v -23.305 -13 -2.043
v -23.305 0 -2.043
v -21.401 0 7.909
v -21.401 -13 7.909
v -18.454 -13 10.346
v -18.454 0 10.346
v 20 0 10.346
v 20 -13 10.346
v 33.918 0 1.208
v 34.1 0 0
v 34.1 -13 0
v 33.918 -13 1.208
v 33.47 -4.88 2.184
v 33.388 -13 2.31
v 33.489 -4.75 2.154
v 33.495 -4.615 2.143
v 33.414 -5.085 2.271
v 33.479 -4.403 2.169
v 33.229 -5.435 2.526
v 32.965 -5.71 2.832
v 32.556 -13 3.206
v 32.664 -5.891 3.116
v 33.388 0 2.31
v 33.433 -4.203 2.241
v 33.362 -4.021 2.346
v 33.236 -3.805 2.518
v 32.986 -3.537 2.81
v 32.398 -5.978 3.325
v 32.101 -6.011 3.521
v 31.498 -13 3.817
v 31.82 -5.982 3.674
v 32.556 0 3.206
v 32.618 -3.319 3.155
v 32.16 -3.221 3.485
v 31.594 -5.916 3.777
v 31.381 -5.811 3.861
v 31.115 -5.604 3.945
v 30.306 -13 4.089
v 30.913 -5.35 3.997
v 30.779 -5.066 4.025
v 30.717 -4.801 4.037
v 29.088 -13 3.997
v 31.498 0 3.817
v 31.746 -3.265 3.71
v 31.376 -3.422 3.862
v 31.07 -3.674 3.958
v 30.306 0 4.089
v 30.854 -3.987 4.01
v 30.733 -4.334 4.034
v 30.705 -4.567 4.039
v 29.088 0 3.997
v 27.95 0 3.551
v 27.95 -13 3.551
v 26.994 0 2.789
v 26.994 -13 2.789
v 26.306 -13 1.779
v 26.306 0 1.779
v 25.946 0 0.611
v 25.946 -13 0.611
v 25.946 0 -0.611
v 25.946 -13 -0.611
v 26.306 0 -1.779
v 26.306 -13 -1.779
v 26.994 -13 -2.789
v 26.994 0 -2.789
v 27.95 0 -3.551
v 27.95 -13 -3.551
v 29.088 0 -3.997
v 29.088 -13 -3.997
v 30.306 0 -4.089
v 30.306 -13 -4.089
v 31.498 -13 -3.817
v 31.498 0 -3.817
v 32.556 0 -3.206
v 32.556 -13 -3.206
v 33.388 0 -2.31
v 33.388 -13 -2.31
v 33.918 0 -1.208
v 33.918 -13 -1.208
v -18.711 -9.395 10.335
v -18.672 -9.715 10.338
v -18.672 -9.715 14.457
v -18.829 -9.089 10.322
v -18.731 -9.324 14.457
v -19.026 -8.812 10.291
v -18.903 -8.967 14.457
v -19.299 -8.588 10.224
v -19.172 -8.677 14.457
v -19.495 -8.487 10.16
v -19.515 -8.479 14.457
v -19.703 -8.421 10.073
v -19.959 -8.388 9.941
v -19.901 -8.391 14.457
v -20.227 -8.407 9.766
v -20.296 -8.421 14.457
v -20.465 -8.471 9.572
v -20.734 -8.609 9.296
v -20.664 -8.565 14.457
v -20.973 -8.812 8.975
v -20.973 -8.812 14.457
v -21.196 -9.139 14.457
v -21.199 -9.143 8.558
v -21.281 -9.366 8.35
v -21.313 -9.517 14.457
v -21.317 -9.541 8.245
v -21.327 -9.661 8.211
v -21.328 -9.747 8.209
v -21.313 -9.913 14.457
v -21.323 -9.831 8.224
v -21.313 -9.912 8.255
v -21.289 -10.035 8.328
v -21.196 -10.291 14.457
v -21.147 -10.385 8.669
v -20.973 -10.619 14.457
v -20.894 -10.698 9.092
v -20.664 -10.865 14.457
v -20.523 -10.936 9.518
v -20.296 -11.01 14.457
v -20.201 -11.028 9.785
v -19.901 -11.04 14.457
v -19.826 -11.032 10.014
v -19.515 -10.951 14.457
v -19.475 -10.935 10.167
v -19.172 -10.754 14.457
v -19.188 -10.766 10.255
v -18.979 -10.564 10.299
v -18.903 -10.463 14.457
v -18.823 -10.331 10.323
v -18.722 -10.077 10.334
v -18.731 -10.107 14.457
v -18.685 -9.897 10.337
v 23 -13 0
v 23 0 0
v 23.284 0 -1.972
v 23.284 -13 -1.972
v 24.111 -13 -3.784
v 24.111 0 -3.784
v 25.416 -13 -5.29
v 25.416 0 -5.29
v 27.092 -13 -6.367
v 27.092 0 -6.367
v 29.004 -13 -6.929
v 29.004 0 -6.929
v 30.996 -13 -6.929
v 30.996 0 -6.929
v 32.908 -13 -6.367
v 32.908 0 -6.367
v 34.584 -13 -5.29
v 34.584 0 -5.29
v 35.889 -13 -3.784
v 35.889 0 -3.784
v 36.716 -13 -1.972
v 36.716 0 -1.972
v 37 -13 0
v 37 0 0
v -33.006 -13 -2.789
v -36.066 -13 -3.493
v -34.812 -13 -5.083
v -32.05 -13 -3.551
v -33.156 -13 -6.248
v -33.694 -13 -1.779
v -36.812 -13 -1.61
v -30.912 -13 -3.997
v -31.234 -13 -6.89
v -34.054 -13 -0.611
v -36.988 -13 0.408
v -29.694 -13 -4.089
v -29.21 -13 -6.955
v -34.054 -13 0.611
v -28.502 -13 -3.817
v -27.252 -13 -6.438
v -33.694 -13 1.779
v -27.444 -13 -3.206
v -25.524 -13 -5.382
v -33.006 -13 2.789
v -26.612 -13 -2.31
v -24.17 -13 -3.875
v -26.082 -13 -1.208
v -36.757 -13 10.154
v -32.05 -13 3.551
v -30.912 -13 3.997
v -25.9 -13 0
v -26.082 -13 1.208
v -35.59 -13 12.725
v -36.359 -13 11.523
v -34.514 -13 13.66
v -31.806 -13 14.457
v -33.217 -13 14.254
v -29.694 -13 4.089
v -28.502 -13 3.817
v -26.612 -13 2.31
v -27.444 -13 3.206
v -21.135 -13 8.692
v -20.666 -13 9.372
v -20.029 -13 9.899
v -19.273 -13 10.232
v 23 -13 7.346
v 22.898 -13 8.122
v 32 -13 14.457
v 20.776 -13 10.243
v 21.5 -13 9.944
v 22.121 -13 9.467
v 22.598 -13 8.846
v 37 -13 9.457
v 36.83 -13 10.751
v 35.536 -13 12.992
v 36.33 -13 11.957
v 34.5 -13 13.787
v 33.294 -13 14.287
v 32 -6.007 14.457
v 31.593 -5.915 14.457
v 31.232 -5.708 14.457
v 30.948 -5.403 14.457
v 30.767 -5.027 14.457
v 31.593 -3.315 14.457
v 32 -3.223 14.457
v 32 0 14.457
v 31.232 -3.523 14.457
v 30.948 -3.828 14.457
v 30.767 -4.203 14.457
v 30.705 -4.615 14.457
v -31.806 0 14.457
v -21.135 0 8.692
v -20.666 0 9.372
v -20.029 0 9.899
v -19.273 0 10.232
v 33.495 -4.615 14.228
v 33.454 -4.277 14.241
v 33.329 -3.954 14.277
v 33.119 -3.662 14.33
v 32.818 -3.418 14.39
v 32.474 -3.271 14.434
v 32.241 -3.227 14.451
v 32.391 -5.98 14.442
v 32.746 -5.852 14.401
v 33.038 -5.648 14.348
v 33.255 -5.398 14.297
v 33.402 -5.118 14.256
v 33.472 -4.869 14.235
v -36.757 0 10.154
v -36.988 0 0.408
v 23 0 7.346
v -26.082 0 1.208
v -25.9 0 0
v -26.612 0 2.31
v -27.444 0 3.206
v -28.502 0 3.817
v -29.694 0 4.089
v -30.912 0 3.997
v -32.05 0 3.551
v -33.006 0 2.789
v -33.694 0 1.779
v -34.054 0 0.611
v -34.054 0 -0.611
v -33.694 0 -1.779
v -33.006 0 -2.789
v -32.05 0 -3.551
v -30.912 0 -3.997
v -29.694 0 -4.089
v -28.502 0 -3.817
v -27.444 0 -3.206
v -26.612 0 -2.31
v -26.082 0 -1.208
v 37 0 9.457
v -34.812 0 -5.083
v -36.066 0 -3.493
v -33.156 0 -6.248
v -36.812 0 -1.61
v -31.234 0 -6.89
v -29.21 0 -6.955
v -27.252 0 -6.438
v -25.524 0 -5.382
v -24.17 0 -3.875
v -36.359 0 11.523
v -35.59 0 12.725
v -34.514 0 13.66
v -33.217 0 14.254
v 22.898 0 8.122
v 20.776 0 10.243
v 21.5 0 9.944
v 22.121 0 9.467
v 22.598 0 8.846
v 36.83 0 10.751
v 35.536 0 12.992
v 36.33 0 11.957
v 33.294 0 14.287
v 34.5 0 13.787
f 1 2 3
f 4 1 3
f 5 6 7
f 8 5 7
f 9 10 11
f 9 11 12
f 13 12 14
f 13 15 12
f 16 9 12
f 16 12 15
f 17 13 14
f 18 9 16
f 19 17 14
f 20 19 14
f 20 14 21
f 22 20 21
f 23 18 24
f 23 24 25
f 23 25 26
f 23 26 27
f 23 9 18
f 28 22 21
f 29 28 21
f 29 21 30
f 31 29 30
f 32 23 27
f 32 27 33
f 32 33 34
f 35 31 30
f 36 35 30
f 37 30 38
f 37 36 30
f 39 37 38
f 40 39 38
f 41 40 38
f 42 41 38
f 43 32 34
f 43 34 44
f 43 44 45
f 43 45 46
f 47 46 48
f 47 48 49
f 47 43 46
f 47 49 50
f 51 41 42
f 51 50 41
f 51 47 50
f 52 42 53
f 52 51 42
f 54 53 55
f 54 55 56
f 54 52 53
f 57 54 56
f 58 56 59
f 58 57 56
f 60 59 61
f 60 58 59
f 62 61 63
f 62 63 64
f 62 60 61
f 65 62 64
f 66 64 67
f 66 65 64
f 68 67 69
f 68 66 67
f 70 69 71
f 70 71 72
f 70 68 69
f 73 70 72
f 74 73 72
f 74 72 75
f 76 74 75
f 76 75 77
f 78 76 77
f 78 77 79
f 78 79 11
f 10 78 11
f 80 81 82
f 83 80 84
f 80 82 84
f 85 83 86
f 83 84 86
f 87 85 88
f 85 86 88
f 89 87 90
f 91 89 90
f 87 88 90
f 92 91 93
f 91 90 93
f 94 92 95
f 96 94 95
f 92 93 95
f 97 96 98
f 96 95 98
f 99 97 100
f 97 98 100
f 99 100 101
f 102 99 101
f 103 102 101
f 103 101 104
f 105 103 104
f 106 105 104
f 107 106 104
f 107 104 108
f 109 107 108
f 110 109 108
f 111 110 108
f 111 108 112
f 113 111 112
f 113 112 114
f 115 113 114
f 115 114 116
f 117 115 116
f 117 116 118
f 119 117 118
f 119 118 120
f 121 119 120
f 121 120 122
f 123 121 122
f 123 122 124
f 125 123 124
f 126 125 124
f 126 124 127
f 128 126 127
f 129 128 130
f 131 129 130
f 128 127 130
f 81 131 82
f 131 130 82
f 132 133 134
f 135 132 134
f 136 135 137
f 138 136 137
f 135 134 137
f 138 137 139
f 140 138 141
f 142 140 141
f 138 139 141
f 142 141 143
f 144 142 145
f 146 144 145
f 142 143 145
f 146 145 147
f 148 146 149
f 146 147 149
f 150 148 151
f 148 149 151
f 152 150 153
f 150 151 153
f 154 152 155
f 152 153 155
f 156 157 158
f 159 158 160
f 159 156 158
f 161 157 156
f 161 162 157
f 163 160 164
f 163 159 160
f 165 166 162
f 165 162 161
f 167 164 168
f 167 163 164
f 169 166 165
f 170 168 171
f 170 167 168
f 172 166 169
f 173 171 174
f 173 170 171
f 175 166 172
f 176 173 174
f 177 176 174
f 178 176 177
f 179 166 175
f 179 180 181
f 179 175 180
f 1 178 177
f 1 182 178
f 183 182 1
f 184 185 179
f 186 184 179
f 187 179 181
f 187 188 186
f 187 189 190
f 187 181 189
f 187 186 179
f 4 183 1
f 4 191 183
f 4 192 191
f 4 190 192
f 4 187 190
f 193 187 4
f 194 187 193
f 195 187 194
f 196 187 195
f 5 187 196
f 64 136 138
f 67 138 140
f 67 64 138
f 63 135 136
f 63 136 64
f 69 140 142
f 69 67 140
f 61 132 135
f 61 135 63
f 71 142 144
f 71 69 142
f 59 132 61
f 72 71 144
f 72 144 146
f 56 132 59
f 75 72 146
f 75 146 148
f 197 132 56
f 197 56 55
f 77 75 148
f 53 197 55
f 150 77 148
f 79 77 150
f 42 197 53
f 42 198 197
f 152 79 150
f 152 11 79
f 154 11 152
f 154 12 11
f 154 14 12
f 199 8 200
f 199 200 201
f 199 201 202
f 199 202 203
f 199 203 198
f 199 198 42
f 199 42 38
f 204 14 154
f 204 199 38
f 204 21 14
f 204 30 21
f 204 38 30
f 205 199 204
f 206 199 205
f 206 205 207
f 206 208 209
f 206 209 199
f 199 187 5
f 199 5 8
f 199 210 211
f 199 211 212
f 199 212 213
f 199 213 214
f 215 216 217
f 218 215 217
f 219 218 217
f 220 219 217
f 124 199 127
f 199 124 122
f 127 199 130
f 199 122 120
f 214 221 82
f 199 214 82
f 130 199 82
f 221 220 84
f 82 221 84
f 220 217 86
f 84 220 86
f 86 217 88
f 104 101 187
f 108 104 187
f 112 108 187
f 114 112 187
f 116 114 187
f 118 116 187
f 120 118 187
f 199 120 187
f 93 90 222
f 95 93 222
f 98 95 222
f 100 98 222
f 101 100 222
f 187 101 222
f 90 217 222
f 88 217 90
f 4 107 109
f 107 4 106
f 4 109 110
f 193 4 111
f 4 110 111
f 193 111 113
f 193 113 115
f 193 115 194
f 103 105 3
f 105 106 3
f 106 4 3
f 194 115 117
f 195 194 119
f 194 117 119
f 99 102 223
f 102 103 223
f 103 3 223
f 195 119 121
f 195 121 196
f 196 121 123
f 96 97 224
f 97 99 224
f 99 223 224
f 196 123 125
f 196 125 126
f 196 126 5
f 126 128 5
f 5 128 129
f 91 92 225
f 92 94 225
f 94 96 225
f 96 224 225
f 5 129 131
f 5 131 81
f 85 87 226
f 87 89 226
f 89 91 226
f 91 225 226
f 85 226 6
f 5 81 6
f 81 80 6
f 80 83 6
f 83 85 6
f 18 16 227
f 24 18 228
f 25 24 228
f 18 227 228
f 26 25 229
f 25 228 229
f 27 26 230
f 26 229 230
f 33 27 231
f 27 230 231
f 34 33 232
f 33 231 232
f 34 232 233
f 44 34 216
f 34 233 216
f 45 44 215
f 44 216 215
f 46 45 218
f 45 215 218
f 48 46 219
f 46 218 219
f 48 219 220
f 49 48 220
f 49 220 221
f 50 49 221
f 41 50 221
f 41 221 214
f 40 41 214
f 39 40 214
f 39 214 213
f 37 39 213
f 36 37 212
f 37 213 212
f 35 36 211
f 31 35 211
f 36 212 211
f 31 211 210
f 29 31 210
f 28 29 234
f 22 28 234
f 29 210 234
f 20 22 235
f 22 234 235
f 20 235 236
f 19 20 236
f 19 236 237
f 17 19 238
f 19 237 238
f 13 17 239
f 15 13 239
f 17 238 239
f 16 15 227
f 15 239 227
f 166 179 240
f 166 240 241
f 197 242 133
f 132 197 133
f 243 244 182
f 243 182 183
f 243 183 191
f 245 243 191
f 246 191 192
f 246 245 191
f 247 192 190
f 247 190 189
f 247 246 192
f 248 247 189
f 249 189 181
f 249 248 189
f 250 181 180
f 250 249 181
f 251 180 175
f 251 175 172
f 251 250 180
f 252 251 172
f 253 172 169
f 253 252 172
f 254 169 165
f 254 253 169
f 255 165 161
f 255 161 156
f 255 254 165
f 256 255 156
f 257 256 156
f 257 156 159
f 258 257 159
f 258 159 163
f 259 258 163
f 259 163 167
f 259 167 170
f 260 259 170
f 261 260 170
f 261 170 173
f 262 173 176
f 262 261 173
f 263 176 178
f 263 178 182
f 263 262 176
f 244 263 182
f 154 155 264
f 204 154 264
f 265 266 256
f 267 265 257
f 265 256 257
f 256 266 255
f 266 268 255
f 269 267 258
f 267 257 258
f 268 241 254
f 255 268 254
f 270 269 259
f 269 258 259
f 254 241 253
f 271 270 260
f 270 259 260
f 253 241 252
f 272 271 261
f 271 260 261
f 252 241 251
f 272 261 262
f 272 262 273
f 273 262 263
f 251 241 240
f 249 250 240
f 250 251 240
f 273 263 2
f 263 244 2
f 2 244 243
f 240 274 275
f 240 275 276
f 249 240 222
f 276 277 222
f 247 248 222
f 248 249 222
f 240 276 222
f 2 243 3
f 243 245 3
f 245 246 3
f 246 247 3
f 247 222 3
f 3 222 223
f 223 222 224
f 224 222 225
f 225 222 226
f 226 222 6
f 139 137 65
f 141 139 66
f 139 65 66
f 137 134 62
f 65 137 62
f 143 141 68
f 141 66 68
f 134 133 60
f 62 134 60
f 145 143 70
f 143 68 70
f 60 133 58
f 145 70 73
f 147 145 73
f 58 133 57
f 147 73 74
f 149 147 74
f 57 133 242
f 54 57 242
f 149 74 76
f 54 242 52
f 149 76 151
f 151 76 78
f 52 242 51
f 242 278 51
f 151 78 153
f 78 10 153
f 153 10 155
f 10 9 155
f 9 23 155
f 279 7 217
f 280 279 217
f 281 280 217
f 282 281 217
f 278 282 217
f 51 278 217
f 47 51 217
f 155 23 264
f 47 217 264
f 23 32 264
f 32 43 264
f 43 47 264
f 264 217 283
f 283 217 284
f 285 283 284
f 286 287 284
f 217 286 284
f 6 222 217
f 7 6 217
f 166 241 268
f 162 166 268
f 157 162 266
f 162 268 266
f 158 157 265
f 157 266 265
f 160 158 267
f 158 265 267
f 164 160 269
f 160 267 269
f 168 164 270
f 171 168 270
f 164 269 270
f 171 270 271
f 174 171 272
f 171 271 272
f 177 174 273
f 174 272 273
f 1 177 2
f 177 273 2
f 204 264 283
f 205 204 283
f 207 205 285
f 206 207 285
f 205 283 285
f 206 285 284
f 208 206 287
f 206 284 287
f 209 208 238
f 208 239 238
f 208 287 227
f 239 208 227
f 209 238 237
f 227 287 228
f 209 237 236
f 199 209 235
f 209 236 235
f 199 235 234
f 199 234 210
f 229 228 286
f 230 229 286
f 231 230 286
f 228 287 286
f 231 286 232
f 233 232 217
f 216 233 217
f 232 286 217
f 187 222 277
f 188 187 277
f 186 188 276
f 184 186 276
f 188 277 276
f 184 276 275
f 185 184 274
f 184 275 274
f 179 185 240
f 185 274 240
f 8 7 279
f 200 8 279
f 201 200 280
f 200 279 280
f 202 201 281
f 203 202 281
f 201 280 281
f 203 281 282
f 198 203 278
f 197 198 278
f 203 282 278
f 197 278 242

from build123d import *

# Parameters (mm, degrees)
F0_R     = 4.1
F1_DEPTH = 13
F2_R     = 1.327998
F2_R_2   = 1.395389
F3_DEPTH = 15


with BuildPart() as f1:
    # F0 (on Front) → F1 (new body)
    with BuildSketch(Plane.XZ):
        with BuildLine():
            Line((-36.756809, 10.154071), (-36.988087, 0.408211))
            ThreePointArc((-36.988087, 0.408211), (-31.234461, -6.890291), (-23.304849, -2.043272))
            Line((-23.304849, -2.043272), (-21.400974, 7.909327))
            ThreePointArc((-21.400974, 7.909327), (-20.366079, 9.657697), (-18.454402, 10.345665))
            Line((-18.454402, 10.345665), (-9.227201, 10.345665))
            Line((-9.227201, 10.345665), (0, 10.345665))
            Line((0, 10.345665), (10, 10.345665))
            Line((10, 10.345665), (20, 10.345665))
            ThreePointArc((20, 10.345665), (22.12132, 9.466985), (23, 7.345665))
            Line((23, 7.345665), (23, 0))
            ThreePointArc((23, 0), (30, -7), (37, 0))
            Line((37, 0), (37, 9.456913))
            ThreePointArc((37, 9.456913), (35.535534, 12.992447), (32, 14.456913))
            Line((32, 14.456913), (1.21127, 14.456913))
            Line((1.21127, 14.456913), (-1.21127, 14.456913))
            Line((-1.21127, 14.456913), (-31.805651, 14.456913))
            ThreePointArc((-31.805651, 14.456913), (-35.085453, 13.230889), (-36.756809, 10.154071))
        make_face()
        with Locations((-30, 0)):
            Circle(F0_R, mode=Mode.SUBTRACT)
        with Locations((30, 0)):
            Circle(F0_R, mode=Mode.SUBTRACT)
    extrude(amount=F1_DEPTH)

    # F2 (on face) → F3 (cut)
    with BuildSketch(Plane.XY.offset(14.456913)):
        with Locations((-20, -9.715236)):
            Circle(F2_R)
        with Locations((32.1, -4.615236)):
            Circle(F2_R_2)
    extrude(amount=-F3_DEPTH, mode=Mode.SUBTRACT)


solid = f1.part
